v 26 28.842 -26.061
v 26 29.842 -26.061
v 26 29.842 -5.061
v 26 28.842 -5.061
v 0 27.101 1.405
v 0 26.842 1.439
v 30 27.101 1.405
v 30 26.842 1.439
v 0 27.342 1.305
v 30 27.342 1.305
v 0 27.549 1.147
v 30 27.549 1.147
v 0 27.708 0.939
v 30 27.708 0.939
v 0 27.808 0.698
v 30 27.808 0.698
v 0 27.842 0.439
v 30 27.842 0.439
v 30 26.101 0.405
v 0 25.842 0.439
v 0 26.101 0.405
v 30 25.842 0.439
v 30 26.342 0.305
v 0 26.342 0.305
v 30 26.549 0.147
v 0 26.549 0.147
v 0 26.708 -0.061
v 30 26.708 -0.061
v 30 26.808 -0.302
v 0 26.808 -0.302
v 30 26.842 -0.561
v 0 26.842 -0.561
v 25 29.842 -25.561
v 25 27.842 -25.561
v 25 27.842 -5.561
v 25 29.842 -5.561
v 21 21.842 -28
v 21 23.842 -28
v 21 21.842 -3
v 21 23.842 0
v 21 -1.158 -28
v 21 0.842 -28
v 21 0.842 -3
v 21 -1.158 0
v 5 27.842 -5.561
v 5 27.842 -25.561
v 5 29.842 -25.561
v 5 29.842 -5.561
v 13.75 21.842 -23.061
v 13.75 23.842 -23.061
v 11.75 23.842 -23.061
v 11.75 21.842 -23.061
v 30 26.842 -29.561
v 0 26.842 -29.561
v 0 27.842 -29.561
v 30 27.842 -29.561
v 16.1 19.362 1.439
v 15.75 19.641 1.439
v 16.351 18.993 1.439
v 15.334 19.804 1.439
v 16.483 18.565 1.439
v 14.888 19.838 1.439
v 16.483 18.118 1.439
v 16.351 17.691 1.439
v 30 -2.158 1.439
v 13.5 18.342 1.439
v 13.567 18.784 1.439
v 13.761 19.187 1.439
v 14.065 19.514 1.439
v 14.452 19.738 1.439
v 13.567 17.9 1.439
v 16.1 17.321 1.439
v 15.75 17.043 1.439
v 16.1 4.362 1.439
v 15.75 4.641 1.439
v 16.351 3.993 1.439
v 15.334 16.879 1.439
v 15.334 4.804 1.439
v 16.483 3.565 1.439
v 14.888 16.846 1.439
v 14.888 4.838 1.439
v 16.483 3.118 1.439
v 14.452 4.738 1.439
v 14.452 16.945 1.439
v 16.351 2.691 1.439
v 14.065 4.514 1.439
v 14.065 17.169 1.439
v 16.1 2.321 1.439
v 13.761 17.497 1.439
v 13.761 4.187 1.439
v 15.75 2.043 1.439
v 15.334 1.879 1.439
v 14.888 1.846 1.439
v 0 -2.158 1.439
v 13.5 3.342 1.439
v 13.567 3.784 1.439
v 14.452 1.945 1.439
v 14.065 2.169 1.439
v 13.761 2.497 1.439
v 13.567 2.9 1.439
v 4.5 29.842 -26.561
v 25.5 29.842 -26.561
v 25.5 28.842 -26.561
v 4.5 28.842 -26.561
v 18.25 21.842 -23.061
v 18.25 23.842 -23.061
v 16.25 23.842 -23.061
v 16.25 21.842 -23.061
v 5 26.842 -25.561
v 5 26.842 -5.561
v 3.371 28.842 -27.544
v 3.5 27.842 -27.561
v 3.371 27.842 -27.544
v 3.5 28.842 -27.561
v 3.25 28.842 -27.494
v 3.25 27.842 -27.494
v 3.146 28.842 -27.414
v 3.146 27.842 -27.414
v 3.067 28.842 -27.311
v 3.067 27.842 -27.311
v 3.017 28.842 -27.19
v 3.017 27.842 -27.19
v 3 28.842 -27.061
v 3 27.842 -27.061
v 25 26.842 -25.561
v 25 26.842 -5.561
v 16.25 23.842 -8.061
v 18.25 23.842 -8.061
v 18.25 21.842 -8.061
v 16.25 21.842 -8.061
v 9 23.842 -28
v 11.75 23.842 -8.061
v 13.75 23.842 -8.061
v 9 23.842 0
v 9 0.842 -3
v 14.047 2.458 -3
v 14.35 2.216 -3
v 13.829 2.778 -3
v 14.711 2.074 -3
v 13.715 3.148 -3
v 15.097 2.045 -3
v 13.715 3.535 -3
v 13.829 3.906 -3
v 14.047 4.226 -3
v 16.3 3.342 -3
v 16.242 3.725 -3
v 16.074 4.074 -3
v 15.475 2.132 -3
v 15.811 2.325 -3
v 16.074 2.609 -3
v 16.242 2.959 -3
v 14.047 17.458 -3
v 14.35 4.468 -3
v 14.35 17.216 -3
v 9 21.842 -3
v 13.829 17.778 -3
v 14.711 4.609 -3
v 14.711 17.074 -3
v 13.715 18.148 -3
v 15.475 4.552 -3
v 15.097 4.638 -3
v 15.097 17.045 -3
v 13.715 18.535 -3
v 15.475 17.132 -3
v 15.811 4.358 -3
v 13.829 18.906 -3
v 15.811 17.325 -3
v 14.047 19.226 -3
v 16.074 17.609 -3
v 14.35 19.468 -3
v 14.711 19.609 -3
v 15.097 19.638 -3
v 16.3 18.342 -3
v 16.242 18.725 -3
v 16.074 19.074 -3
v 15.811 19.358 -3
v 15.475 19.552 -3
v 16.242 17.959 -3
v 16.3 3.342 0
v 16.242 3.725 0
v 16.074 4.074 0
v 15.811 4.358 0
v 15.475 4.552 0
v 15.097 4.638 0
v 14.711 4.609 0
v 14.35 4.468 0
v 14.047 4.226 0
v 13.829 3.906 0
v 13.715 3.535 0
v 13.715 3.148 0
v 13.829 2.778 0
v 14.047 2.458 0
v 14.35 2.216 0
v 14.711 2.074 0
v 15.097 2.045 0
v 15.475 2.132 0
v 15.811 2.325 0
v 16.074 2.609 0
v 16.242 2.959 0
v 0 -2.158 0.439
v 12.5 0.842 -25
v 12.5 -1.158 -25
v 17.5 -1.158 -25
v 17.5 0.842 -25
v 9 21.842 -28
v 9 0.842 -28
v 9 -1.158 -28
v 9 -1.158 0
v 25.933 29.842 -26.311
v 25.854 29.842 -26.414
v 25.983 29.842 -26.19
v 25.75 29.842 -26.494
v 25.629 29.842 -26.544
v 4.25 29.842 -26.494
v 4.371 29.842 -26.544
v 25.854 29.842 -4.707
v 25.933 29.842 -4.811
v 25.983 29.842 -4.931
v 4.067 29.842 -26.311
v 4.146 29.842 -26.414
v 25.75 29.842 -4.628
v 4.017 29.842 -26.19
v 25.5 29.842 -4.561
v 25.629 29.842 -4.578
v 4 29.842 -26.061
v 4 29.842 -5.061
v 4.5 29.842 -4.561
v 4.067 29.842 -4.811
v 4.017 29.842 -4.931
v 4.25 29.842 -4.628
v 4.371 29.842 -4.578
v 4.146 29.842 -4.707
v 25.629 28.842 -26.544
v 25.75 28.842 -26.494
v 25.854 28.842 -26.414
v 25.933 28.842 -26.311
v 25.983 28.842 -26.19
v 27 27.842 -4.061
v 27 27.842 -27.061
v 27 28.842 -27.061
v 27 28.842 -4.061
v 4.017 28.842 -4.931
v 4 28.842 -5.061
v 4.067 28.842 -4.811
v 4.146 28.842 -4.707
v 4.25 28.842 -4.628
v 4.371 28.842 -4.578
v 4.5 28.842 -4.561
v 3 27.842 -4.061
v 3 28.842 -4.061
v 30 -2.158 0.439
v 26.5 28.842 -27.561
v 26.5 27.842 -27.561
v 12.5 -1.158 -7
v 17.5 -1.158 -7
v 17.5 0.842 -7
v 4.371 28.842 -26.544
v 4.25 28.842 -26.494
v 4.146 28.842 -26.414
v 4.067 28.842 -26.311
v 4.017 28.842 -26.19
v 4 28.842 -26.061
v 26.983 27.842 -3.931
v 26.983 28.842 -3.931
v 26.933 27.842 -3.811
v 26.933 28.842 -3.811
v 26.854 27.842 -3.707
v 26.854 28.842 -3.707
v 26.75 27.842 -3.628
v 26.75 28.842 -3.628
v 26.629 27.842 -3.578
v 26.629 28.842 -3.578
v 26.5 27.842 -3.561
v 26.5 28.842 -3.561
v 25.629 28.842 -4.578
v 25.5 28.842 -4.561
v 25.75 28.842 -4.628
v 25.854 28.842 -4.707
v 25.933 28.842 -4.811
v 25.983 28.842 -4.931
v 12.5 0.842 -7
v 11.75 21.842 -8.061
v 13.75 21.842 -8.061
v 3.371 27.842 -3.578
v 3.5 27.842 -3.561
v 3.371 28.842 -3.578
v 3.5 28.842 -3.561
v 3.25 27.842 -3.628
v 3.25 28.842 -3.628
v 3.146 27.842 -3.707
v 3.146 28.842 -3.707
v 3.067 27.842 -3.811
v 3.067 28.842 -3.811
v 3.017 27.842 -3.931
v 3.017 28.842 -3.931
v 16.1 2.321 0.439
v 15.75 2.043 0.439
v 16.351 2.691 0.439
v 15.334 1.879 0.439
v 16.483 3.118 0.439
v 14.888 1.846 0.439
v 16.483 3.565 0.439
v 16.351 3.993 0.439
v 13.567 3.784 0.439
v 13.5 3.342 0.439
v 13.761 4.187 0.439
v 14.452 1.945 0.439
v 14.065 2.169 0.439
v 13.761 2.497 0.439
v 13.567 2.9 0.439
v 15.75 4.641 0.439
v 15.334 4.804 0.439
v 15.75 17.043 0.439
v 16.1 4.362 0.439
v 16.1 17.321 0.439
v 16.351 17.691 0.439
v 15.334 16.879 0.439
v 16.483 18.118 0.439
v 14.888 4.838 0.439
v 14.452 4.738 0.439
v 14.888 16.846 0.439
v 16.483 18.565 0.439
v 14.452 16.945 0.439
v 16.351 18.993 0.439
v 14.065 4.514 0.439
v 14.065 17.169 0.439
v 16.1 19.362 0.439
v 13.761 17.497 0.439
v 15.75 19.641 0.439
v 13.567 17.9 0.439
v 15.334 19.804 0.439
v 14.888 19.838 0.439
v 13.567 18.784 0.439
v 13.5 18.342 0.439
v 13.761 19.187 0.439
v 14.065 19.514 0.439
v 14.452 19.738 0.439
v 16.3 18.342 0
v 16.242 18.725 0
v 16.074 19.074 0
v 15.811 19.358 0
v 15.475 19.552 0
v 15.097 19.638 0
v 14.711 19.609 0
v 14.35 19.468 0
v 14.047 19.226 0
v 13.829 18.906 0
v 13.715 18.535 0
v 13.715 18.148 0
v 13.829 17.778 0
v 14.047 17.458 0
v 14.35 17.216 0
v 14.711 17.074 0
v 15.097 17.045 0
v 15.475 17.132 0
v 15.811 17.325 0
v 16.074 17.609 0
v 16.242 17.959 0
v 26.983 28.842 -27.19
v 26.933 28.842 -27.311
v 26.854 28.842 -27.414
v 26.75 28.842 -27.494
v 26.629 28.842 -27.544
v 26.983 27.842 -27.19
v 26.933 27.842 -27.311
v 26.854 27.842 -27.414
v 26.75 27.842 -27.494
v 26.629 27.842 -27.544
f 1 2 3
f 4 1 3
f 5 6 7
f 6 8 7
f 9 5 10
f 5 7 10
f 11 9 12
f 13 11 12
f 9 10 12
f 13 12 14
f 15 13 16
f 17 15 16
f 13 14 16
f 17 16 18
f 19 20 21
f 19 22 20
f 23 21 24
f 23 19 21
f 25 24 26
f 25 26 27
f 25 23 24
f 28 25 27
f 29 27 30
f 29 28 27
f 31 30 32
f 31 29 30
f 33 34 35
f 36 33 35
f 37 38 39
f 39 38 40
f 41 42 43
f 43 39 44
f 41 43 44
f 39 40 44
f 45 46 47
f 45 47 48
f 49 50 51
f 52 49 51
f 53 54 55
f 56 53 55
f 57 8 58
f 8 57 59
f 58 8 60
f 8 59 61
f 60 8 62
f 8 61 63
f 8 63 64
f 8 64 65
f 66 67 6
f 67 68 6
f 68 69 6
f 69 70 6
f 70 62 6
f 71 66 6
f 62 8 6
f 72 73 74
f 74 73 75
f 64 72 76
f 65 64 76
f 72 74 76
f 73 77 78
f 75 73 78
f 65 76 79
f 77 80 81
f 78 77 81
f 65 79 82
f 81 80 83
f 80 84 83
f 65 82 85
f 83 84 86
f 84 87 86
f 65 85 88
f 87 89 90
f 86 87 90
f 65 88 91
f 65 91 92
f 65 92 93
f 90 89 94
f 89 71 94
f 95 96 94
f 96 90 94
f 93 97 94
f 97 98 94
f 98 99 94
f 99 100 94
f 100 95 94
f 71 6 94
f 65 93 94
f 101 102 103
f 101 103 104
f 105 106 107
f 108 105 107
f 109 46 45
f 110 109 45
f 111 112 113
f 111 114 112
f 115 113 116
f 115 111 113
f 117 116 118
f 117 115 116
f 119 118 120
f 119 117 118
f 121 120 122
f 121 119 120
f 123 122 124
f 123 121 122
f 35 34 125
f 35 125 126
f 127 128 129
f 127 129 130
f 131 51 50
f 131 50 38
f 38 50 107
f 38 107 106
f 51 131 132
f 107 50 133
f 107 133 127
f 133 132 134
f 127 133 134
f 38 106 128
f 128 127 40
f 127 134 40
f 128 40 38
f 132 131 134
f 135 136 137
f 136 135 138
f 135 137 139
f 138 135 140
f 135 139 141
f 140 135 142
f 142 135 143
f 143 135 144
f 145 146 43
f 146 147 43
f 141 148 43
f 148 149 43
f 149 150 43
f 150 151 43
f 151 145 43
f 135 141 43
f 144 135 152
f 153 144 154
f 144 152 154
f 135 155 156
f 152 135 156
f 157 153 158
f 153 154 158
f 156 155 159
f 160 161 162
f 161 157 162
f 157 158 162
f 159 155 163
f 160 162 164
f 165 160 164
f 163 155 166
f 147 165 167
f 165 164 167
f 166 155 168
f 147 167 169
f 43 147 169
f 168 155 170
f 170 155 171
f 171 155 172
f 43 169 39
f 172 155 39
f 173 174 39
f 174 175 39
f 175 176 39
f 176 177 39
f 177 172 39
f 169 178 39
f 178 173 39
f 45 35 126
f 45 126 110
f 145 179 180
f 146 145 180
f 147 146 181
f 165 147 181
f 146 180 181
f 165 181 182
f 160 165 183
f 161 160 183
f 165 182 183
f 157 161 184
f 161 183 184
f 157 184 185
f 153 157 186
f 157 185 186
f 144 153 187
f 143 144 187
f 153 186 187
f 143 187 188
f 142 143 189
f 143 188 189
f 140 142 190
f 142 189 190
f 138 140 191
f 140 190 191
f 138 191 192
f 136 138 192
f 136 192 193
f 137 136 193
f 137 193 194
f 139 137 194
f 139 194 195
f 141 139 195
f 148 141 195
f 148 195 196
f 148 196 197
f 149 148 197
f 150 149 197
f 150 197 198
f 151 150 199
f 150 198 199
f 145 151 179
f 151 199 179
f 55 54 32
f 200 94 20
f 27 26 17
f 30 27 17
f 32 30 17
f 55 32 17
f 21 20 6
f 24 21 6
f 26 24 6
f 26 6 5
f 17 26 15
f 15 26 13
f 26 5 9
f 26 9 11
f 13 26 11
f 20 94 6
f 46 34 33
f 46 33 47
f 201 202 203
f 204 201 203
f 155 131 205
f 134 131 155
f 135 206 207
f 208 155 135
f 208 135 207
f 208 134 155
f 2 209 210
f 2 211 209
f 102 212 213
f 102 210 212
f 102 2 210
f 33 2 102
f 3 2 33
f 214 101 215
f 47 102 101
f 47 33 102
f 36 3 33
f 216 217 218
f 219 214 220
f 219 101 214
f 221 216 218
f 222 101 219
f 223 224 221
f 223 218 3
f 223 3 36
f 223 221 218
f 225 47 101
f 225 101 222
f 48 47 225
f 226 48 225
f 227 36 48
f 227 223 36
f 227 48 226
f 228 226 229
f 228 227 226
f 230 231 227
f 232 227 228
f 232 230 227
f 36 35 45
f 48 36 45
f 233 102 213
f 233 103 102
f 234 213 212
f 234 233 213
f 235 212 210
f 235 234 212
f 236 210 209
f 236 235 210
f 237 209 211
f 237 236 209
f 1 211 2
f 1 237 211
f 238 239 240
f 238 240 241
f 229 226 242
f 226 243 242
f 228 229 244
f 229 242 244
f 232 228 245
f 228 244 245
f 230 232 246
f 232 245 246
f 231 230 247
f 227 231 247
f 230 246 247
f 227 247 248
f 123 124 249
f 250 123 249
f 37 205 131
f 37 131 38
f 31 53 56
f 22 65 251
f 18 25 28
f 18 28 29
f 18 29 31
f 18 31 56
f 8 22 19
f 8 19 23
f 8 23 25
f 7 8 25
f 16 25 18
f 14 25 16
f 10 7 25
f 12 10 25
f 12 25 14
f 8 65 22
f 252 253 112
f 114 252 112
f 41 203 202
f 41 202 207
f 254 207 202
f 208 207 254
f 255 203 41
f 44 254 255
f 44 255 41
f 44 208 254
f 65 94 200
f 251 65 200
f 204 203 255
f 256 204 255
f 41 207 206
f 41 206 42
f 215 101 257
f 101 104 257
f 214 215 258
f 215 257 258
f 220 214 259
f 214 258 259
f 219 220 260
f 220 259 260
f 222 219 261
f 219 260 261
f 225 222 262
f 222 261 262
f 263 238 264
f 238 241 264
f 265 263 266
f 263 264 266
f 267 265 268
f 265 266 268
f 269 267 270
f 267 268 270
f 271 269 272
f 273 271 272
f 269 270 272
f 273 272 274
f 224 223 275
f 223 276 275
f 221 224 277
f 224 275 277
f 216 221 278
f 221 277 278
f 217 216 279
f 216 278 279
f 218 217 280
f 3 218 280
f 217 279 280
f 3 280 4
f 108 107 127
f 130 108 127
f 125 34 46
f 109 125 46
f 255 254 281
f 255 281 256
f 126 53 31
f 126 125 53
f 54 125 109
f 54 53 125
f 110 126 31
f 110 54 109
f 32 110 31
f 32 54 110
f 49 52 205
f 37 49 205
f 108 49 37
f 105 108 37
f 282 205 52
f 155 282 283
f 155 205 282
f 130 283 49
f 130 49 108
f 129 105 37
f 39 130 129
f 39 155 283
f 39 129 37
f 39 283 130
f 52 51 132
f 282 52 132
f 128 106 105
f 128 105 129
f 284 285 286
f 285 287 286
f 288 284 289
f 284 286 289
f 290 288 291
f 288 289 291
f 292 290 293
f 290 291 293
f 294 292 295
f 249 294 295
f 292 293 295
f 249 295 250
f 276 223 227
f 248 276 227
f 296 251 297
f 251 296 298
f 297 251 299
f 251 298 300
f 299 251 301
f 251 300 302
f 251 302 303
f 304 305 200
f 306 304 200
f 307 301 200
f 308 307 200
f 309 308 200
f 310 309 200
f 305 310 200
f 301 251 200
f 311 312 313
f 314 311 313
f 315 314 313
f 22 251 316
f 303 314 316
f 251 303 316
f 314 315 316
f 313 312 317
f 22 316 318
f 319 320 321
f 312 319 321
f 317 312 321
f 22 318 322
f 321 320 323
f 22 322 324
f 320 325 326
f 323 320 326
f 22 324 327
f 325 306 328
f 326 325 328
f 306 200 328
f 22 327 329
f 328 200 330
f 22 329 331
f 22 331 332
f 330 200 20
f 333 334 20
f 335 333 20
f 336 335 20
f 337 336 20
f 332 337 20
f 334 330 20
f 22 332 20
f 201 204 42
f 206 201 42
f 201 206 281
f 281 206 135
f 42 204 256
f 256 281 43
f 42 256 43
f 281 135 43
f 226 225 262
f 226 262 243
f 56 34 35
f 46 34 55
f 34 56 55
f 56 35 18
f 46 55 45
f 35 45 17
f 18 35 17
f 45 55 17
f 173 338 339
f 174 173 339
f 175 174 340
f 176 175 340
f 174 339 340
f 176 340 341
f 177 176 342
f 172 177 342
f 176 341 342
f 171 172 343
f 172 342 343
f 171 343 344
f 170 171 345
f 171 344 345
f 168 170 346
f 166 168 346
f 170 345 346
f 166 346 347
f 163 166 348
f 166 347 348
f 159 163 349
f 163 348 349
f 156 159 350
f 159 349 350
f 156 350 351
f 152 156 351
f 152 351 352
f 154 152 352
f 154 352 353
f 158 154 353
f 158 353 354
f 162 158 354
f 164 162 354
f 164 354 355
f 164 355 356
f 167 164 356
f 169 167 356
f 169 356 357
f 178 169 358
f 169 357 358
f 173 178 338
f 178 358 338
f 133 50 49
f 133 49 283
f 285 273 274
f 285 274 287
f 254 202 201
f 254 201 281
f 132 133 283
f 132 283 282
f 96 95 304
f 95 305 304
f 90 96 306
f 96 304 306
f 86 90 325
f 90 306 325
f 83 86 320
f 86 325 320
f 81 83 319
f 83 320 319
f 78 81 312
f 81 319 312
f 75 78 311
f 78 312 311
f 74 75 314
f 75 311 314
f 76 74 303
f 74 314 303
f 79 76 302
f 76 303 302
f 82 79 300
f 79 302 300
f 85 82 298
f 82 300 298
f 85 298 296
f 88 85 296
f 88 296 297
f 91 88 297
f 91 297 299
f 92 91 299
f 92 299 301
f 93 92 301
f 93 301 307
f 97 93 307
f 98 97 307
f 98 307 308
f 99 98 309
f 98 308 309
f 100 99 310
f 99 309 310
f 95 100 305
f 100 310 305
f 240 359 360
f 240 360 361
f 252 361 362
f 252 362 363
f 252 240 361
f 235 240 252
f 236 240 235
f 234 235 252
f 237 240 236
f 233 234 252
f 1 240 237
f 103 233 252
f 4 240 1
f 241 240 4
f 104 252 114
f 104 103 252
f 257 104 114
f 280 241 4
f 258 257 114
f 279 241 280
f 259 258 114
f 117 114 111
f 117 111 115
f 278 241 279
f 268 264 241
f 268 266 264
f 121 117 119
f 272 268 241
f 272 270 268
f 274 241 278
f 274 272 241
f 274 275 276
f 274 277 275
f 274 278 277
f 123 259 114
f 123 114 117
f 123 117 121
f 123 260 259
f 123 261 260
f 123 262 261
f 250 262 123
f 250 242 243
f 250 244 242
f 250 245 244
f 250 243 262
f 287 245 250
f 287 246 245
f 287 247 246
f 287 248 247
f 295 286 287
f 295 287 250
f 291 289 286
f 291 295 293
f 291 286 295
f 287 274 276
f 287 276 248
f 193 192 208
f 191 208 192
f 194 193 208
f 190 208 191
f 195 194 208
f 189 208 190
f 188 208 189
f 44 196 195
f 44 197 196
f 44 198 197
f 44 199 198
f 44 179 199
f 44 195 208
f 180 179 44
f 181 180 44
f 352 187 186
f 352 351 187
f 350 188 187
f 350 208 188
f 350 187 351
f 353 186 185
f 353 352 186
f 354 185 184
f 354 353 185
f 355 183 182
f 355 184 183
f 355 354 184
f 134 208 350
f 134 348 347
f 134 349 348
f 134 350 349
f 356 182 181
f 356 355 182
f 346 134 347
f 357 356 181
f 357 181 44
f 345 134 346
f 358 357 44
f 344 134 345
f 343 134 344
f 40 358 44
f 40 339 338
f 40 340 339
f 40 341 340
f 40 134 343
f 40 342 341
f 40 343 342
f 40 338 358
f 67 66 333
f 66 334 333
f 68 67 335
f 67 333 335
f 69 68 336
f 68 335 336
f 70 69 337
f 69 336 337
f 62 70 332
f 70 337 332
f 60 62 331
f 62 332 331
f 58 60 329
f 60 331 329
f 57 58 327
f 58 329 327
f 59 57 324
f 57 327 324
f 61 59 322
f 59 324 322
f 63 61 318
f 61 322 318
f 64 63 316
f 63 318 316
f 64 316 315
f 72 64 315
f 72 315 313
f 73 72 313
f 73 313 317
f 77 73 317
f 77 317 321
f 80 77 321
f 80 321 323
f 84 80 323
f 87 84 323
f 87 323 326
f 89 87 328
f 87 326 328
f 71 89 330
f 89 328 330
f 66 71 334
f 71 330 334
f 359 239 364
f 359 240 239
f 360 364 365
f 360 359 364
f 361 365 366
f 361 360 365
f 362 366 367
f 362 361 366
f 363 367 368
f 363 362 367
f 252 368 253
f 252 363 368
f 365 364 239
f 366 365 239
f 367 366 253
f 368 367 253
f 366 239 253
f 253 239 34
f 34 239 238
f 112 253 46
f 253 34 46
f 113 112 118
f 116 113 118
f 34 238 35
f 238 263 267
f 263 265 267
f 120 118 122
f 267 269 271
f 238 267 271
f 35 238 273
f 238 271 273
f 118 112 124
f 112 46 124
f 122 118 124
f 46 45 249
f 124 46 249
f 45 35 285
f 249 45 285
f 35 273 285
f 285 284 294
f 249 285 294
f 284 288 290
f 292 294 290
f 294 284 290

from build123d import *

# Parameters (mm, degrees)
F0_W      = 1
F0_H      = 30
F1_DEPTH  = 30
F2_R      = 1
F3_W      = 20
F3_H      = 20
F4_DEPTH  = 1
F6_D      = 3
F6_DEPTH  = 1
F6_TIP    = 0.9012909285
F7_W      = 12
F7_H      = 25
F7_R      = 1.3
F8_DEPTH  = 3
F9_W      = 12
F9_H      = 2
F10_DEPTH = 25
F11_W     = 2
F11_H     = 15
F12_DEPTH = 3
F13_W     = 5
F13_H     = 18
F14_DEPTH = 2
F15_W     = 24
F15_H     = 24
F15_W_2   = 20
F15_H_2   = 20
F16_DEPTH = 2
F17_W     = 24
F17_H     = 24
F17_W_2   = 22
F17_H_2   = 22
F18_DEPTH = 1
F19_R     = 0.5


with BuildPart() as f1:
    # F0 (on Right) → F1 (new body)
    with BuildSketch(Plane.YZ):
        Polygon((27.8417383954, 1.4394566469), (-2.1582616046, 1.4394566469), (-2.1582616046, 0.4394566469), (26.8417383954, 0.4394566469), (27.8417383954, 0.4394566469), align=None)
        with Locations((27.3417383954, -14.5605433531)):
            Rectangle(F0_W, F0_H)
    extrude(amount=F1_DEPTH)

    # F2
    f2_edges = [f1.edges().sort_by_distance(p)[0] for p in [
        (15, 27.841738, 1.439457),
        (15, 26.841738, 0.439457),
    ]]
    fillet(f2_edges, radius=F2_R)

    # F3 (on face) → F4 (cut)
    with BuildSketch(Plane(origin=(0, 27.8417383954, 0), x_dir=(-1, 0, 0), z_dir=(0, 1, 0))):
        with Locations((-15, -15.5605433531)):
            Rectangle(F3_W, F3_H)
    extrude(amount=-F4_DEPTH, mode=Mode.SUBTRACT)

    # F6
    with Locations(Plane.XY.offset(1.4394566469)):
        with Locations((15, 3.3417383954), (15, 18.3417383954)):
            Hole(F6_D / 2, depth=F6_DEPTH)
            with Locations((0, 0, -(F6_DEPTH + F6_TIP / 2))):  # 118° drill point
                Cone(0, F6_D / 2, F6_TIP, mode=Mode.SUBTRACT)


with BuildPart() as f8:
    # F7 (on Top) → F8 (new body)
    with BuildSketch(Plane.XY):
        with Locations((15, 11.3417383954)):
            Rectangle(F7_W, F7_H)
        with Locations((15, 3.3417383954)):
            Circle(F7_R, mode=Mode.SUBTRACT)
        with Locations((15, 18.3417383954)):
            Circle(F7_R, mode=Mode.SUBTRACT)
    extrude(amount=-F8_DEPTH)

    # F9 (on face) → F10 (join)
    with BuildSketch(Plane(origin=(0, 0, -3), x_dir=(1, 0, 0), z_dir=(0, 0, -1))):
        with Locations((15, -22.8417383954)):
            Rectangle(F9_W, F9_H)
        with Locations((15, 0.1582616046)):
            Rectangle(F9_W, F9_H)
    extrude(amount=F10_DEPTH)

    # F11 (on face) → F12 (cut)
    with BuildSketch(Plane(origin=(0, 23.8417383954, 0), x_dir=(-1, 0, 0), z_dir=(0, 1, 0))):
        with Locations((-17.25, -15.5605433531)):
            Rectangle(F11_W, F11_H)
        with Locations((-12.75, -15.5605433531)):
            Rectangle(F11_W, F11_H)
    extrude(amount=-F12_DEPTH, mode=Mode.SUBTRACT)

    # F13 (on face) → F14 (cut)
    with BuildSketch(Plane.XZ.offset(1.1582616046)):
        with Locations((15, -16)):
            Rectangle(F13_W, F13_H)
    extrude(amount=-F14_DEPTH, mode=Mode.SUBTRACT)


with BuildPart() as f16:
    # F15 (on face) → F16 (new body)
    with BuildSketch(Plane(origin=(0, 27.8417383954, 0), x_dir=(-1, 0, 0), z_dir=(0, 1, 0))):
        with Locations((-15, -15.5605433531)):
            Rectangle(F15_W, F15_H)
        with Locations((-15, -15.5605433531)):
            Rectangle(F15_W_2, F15_H_2, mode=Mode.SUBTRACT)
    extrude(amount=F16_DEPTH)

    # F17 (on face) → F18 (cut)
    with BuildSketch(Plane(origin=(0, 29.8417383954, 0), x_dir=(-1, 0, 0), z_dir=(0, 1, 0))):
        with Locations((-15, -15.5605433531)):
            Rectangle(F17_W, F17_H)
        with Locations((-15, -15.5605433531)):
            Rectangle(F17_W_2, F17_H_2, mode=Mode.SUBTRACT)
    extrude(amount=-F18_DEPTH, mode=Mode.SUBTRACT)

    # F19
    f19_edges = [f16.edges().sort_by_distance(p)[0] for p in [
        (26, 29.341738, -4.560543),
        (4, 29.341738, -4.560543),
        (4, 29.341738, -26.560543),
        (26, 29.341738, -26.560543),
        (27, 28.341738, -3.560543),
        (3, 28.341738, -3.560543),
        (27, 28.341738, -27.560543),
        (3, 28.341738, -27.560543),
    ]]
    fillet(f19_edges, radius=F19_R)


solid = Compound([f1.part, f8.part, f16.part])
